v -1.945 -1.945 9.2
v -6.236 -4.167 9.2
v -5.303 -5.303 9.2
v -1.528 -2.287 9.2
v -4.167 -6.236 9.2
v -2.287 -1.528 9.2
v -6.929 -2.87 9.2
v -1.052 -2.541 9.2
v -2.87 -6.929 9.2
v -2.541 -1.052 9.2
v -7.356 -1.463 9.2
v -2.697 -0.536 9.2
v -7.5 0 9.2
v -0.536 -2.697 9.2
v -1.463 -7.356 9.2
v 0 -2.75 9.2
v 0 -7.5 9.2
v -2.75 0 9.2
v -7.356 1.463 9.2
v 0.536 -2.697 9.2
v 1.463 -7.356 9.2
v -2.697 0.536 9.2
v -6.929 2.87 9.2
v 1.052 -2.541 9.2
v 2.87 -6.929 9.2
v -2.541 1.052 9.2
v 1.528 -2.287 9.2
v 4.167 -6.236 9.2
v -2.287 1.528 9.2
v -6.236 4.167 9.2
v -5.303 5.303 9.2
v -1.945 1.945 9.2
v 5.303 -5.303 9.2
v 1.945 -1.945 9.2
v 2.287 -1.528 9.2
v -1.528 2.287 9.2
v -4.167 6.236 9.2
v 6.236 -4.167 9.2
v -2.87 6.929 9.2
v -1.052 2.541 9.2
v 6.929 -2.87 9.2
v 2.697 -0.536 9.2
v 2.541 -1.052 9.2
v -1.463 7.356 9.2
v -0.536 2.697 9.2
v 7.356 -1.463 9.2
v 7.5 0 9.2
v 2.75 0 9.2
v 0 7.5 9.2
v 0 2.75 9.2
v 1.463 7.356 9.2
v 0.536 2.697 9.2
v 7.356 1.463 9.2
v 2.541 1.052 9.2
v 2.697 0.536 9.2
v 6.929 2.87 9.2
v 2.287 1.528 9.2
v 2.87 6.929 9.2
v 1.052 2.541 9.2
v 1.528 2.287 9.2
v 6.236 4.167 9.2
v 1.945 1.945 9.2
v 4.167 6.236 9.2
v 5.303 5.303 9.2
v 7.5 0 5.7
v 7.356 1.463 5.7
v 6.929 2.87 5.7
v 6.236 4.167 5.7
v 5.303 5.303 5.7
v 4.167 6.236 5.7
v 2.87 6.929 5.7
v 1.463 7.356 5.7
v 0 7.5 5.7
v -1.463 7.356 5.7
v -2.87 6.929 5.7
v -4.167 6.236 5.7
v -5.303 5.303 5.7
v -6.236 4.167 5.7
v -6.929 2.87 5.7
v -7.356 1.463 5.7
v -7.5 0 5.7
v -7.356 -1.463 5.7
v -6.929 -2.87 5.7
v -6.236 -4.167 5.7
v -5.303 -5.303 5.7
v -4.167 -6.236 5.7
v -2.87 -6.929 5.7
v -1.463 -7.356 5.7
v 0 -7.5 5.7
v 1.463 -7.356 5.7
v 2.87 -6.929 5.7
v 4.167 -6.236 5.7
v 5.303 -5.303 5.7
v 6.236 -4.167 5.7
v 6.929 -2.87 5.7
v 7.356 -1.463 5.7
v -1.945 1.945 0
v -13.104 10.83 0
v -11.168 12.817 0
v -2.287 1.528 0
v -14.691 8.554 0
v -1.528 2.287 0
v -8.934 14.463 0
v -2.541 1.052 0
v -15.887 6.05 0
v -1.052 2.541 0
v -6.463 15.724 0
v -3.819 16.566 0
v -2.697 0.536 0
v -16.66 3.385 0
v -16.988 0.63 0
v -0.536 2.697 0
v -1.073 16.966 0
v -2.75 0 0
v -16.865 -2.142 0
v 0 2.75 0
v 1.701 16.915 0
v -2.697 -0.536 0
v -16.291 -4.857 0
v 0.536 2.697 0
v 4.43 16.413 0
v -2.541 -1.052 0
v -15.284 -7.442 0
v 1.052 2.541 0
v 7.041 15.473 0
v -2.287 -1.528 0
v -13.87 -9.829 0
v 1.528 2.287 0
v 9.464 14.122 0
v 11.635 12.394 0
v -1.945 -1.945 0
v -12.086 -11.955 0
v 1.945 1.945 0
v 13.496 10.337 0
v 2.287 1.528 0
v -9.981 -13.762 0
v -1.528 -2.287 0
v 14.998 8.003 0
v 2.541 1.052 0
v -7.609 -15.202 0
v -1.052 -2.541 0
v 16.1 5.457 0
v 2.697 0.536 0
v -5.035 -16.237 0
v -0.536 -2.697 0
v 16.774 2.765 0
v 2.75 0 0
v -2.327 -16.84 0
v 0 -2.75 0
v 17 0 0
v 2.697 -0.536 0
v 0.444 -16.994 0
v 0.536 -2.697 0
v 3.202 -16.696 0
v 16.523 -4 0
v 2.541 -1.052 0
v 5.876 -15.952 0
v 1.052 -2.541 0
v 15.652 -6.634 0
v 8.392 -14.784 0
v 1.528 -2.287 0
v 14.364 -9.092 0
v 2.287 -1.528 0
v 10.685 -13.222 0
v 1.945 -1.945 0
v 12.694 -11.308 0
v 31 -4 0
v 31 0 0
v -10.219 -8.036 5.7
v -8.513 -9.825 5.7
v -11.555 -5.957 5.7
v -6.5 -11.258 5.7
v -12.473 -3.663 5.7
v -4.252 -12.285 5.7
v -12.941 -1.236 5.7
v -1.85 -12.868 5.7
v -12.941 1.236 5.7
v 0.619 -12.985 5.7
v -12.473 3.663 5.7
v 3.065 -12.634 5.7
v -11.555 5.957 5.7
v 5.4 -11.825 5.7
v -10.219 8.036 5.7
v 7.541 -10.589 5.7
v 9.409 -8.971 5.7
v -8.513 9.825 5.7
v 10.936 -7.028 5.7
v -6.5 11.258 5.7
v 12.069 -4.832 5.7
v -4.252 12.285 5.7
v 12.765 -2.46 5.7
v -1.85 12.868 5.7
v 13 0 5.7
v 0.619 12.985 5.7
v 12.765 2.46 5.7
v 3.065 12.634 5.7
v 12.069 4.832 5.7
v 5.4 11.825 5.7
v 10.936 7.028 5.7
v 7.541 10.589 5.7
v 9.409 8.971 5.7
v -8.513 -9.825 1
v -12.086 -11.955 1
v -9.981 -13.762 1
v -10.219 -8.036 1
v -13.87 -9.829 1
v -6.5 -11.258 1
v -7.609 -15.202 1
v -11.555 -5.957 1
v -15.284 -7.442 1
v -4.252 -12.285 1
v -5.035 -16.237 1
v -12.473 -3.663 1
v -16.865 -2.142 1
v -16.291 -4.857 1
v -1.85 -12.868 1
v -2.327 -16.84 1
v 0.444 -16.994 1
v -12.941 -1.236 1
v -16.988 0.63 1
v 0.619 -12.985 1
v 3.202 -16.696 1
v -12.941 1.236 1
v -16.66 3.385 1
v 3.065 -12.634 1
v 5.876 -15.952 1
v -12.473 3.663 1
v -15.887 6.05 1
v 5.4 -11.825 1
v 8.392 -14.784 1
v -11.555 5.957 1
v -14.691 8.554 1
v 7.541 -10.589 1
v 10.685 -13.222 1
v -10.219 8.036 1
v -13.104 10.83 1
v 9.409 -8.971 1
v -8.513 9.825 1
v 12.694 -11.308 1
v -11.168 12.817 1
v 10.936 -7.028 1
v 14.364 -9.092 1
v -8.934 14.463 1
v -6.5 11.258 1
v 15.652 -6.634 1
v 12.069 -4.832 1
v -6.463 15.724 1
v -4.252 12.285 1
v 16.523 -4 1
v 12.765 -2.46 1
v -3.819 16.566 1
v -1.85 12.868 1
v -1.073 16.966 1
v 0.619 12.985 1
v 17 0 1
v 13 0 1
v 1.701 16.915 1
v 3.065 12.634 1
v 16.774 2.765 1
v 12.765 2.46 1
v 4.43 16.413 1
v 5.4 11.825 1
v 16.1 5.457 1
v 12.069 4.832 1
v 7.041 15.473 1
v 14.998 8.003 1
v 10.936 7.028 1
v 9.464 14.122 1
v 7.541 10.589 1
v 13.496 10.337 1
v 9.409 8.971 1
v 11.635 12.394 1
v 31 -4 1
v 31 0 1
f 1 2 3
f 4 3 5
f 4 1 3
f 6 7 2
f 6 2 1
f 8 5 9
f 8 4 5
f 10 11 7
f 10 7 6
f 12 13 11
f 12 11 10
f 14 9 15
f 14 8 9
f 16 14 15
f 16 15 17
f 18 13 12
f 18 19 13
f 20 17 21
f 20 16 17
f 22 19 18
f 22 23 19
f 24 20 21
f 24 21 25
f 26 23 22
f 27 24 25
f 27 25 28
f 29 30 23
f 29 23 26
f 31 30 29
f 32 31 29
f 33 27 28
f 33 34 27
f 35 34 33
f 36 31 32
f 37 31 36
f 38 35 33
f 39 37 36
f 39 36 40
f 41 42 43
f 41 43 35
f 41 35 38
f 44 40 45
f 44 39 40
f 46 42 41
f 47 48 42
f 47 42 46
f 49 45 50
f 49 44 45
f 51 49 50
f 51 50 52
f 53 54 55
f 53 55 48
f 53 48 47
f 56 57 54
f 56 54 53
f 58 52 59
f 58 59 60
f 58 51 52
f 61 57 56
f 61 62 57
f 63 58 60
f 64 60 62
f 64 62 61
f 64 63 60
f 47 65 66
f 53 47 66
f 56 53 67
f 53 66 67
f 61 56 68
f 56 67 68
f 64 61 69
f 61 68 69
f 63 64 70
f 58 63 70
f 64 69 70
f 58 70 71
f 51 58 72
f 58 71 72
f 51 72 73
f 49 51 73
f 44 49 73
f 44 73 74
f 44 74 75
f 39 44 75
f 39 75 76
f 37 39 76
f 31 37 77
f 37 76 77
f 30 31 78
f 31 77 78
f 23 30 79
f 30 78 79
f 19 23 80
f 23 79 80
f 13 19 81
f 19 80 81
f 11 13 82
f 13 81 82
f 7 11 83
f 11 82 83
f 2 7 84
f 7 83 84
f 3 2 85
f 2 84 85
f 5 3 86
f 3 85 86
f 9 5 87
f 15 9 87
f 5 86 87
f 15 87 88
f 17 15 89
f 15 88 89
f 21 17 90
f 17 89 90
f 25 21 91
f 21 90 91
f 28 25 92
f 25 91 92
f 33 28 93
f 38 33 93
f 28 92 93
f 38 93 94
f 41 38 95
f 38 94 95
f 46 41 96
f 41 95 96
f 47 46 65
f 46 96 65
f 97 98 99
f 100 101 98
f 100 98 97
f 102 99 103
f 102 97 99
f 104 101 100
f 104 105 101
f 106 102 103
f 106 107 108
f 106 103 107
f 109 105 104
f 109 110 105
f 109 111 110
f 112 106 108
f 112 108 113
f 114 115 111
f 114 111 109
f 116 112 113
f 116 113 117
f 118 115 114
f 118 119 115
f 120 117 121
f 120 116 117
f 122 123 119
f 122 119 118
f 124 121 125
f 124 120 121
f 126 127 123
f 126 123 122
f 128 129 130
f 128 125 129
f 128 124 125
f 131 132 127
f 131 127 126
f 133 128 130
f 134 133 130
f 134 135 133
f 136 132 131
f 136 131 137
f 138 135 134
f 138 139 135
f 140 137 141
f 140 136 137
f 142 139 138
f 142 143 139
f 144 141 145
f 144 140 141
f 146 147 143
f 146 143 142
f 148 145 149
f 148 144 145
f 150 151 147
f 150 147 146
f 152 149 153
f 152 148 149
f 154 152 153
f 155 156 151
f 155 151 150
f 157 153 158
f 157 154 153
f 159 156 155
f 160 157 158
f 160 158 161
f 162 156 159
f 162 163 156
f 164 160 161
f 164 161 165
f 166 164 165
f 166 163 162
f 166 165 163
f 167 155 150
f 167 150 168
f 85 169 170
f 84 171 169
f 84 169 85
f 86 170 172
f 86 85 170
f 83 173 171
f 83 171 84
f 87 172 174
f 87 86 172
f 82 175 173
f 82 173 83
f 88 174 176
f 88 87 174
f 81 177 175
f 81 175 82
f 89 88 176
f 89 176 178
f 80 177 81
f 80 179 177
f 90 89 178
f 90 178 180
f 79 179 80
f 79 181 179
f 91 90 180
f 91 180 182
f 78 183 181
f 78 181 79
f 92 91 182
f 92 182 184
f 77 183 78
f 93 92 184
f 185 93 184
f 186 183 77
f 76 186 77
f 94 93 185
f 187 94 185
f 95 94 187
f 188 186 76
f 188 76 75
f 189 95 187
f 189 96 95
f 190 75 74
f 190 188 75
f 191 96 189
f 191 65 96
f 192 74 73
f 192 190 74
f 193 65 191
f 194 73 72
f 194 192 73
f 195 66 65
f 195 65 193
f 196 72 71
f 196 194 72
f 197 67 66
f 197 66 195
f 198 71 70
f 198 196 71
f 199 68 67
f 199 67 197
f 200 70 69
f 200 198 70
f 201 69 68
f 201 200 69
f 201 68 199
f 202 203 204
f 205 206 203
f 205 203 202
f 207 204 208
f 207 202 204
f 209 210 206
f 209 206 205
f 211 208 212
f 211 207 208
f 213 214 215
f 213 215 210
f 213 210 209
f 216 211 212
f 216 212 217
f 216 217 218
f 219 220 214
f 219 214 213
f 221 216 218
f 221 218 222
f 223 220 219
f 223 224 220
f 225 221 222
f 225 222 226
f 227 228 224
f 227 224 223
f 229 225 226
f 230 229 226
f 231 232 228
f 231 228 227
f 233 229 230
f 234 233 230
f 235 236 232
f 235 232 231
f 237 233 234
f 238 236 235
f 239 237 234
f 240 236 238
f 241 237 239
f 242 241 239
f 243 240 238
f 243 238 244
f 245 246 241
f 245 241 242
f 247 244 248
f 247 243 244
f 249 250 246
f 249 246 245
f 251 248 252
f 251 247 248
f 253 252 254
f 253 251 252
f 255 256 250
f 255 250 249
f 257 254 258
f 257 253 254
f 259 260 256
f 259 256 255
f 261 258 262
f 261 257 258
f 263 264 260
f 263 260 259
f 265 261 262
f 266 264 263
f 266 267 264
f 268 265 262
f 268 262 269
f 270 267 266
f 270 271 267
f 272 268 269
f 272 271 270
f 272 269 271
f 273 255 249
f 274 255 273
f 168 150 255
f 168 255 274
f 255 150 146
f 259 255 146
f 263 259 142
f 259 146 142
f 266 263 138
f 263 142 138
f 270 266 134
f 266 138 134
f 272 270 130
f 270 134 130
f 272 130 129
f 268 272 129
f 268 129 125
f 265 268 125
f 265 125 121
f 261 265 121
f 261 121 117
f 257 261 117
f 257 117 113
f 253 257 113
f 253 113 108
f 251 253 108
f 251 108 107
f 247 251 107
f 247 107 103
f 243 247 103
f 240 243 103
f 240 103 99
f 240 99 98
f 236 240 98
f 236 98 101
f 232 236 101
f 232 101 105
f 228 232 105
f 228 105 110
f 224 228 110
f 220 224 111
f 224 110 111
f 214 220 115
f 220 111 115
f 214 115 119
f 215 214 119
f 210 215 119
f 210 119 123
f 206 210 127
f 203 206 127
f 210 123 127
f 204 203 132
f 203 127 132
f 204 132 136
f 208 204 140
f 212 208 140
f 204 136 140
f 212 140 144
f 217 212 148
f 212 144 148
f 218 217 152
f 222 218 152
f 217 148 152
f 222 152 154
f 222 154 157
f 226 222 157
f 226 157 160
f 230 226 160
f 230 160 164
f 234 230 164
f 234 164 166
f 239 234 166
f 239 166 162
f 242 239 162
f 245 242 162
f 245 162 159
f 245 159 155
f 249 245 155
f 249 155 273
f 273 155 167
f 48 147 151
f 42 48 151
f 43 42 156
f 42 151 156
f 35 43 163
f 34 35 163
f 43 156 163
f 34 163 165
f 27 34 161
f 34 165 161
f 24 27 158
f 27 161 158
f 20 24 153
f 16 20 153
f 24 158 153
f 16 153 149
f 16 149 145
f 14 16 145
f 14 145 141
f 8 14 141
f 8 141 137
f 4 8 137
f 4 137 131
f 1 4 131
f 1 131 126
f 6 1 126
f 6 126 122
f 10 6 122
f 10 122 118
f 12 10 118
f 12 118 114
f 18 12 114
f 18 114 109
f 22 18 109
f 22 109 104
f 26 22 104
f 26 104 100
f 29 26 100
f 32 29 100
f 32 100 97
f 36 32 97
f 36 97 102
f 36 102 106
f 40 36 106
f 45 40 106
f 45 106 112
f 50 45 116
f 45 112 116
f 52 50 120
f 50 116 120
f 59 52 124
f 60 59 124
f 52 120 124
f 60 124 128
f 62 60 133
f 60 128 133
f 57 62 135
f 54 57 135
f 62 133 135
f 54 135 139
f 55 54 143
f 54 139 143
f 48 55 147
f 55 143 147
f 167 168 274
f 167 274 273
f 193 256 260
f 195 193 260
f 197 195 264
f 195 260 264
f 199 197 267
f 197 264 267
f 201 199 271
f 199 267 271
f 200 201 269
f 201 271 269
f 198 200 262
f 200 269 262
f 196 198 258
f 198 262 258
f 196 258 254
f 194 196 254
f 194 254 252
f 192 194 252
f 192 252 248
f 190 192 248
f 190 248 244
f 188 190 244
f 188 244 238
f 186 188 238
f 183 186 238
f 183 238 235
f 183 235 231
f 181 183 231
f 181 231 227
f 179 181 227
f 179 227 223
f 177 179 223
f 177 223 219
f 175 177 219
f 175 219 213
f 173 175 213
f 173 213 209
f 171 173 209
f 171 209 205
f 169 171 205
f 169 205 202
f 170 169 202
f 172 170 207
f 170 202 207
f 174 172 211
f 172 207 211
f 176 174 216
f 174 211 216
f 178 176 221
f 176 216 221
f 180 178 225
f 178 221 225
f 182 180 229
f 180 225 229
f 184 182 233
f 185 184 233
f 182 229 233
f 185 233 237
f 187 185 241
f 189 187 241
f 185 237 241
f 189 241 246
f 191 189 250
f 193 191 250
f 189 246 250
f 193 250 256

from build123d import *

# Parameters (mm, degrees)
SKETCH_R     = 17
PAD_DEPTH    = 1
SKETCH001_R  = 13
PAD001_DEPTH = 4.7
SKETCH002_R  = 7.5
PAD002_DEPTH = 3.5
SKETCH003_W  = 31
SKETCH003_H  = 4
PAD003_DEPTH = 1
SKETCH004_R  = 2.75
HOLE_DEPTH   = 9.201


with BuildPart() as part:
    # Sketch → Pad (new body)
    with BuildSketch(Plane.XY):
        Circle(SKETCH_R)
    extrude(amount=PAD_DEPTH)

    # Sketch001 (on Face3 of Pad) → Pad001 (join)
    with BuildSketch(Plane.XY.offset(1)):
        Circle(SKETCH001_R)
    extrude(amount=PAD001_DEPTH)

    # Sketch002 (on Face5 of Pad001) → Pad002 (join)
    with BuildSketch(Plane.XY.offset(5.7)):
        Circle(SKETCH002_R)
    extrude(amount=PAD002_DEPTH)

    # Sketch003 (on Face2 of Pad002) → Pad003 (join)
    with BuildSketch(Plane(origin=(0, 0, 0), x_dir=(1, 0, 0), z_dir=(0, 0, -1))):
        with Locations((15.5, 2)):
            Rectangle(SKETCH003_W, SKETCH003_H)
    extrude(amount=-PAD003_DEPTH)

    # Sketch004 (on Face2 of Pad003) → Hole (cut, through all)
    with BuildSketch(Plane(origin=(0, 0, 0), x_dir=(1, 0, 0), z_dir=(0, 0, -1))):
        Circle(SKETCH004_R)
    extrude(amount=-HOLE_DEPTH, mode=Mode.SUBTRACT)


solid = part.part
